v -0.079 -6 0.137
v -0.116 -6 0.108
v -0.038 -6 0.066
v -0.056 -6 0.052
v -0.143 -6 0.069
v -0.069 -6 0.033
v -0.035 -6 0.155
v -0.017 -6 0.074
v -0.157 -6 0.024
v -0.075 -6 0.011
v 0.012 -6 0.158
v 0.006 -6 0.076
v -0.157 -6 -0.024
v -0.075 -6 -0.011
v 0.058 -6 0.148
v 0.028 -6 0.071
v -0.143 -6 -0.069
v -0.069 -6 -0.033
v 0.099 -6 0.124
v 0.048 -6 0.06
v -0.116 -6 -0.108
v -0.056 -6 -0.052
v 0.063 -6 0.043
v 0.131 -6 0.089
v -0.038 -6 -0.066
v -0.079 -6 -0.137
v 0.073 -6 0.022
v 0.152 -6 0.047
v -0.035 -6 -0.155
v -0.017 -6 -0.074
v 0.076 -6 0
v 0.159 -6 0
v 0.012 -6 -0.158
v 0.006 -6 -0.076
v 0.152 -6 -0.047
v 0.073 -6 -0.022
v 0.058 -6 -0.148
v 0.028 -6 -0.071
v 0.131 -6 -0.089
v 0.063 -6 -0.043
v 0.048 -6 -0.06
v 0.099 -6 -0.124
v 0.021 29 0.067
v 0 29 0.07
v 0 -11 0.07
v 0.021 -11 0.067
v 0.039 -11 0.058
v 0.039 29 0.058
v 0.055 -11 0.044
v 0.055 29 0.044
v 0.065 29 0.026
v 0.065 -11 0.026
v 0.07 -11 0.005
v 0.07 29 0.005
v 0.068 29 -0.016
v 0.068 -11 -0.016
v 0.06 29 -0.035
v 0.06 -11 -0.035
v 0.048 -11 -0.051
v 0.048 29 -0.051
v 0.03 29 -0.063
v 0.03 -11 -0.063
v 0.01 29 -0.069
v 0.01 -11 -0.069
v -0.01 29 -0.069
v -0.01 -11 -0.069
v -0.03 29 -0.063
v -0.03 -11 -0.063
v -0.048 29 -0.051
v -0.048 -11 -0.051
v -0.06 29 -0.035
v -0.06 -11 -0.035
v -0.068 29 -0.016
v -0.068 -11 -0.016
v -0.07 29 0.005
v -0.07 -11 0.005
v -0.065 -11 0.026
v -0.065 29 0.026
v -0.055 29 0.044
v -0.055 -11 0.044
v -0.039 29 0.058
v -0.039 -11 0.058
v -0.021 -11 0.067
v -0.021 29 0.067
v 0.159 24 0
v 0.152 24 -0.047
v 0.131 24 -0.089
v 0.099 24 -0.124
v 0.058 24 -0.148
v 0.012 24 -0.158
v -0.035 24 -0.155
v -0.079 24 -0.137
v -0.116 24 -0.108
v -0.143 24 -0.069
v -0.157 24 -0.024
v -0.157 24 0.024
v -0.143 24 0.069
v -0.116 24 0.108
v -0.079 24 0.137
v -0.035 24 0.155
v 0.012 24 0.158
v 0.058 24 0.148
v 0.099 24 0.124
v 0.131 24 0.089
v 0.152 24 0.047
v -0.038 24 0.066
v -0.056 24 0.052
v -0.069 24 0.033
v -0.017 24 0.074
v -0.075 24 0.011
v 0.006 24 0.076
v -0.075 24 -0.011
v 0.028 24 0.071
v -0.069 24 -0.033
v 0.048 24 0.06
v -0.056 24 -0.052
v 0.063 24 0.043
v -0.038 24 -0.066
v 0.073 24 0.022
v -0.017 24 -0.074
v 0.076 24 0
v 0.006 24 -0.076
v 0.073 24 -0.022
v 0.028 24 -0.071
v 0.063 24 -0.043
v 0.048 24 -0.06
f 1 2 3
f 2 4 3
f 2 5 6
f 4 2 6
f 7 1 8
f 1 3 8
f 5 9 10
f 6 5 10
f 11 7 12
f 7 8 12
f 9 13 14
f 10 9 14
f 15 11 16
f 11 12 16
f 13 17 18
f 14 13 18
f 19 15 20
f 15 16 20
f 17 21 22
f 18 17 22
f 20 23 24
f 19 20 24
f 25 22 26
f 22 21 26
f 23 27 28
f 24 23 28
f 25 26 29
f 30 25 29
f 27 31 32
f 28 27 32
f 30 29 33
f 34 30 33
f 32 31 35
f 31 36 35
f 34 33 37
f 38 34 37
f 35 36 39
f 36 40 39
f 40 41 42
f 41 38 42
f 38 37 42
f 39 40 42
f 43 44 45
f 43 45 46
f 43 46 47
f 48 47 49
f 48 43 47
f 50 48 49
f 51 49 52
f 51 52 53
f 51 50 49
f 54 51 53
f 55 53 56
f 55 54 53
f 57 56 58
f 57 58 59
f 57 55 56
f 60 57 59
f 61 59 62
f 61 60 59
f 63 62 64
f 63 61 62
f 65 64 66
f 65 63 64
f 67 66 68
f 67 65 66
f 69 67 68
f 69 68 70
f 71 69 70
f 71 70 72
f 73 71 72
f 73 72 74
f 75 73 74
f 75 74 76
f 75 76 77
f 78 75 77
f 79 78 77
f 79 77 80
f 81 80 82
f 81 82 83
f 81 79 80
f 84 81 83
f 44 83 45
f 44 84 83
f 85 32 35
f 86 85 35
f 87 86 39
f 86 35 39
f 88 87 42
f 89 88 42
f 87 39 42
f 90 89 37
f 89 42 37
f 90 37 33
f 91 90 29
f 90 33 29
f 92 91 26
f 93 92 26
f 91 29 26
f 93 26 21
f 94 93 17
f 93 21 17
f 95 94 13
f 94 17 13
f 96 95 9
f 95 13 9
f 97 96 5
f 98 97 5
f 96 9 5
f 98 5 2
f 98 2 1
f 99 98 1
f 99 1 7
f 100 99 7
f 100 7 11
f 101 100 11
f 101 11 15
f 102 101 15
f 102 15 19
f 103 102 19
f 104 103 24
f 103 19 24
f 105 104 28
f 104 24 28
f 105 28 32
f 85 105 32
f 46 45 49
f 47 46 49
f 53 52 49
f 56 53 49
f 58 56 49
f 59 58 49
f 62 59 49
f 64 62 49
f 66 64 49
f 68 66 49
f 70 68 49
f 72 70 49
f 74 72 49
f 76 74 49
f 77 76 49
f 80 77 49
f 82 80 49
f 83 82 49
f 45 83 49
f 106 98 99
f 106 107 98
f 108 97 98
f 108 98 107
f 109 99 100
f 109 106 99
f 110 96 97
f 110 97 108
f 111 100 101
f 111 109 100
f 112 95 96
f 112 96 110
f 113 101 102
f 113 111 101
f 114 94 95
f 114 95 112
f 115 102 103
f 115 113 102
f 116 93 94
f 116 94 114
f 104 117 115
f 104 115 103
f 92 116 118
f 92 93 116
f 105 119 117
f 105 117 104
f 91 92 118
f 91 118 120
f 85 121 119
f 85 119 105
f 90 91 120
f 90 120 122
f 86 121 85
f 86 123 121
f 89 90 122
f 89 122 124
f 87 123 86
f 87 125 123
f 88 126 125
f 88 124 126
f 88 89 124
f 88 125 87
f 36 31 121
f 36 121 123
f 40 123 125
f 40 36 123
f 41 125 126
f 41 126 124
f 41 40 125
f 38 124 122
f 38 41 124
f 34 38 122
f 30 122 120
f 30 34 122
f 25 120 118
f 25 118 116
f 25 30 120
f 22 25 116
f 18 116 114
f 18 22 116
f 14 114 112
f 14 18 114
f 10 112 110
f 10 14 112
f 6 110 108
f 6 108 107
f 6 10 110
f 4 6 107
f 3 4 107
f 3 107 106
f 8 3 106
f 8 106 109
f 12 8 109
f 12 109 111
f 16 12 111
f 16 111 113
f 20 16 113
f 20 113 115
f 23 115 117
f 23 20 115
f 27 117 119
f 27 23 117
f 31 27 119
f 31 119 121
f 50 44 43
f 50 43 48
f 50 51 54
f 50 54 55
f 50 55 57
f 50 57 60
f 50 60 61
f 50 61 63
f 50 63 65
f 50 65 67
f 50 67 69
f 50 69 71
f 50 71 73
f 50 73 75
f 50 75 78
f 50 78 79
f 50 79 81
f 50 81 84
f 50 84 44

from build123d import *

# Parameters (mm, degrees)
SWEEP1_START        = -6
SWEEP1_OUTLINE_R    = 0.15875
SWEEP1_OUTLINE_R_2  = 0.0762
SWEEP1_DEPTH        = 30
SKETCH3_R           = 0.06985
BOSS_EXTRUDE1_DEPTH = 40


# Read off the part's stored shape, not the designer's step: Sweep1
with BuildPart() as part:
    # Sweep1 outline → Sweep1 (new body)
    with BuildSketch(Plane(origin=(0, 0, 0), x_dir=(1, 0, 0), z_dir=(0, 1, 0)).offset(SWEEP1_START)):
        Circle(SWEEP1_OUTLINE_R)
        Circle(SWEEP1_OUTLINE_R_2, mode=Mode.SUBTRACT)
    extrude(amount=SWEEP1_DEPTH)


with BuildPart() as body_2:
    # Sketch3 → Boss-Extrude1 (new body)
    with BuildSketch(Plane(origin=(0, 29, 0), x_dir=(1, 0, 0), z_dir=(0, 1, 0))):
        with Locations(Location((0, 0, 0), (0, 0, 270))):
            Circle(SKETCH3_R)
    extrude(amount=-BOSS_EXTRUDE1_DEPTH)


solid = Compound([part.part, body_2.part])
